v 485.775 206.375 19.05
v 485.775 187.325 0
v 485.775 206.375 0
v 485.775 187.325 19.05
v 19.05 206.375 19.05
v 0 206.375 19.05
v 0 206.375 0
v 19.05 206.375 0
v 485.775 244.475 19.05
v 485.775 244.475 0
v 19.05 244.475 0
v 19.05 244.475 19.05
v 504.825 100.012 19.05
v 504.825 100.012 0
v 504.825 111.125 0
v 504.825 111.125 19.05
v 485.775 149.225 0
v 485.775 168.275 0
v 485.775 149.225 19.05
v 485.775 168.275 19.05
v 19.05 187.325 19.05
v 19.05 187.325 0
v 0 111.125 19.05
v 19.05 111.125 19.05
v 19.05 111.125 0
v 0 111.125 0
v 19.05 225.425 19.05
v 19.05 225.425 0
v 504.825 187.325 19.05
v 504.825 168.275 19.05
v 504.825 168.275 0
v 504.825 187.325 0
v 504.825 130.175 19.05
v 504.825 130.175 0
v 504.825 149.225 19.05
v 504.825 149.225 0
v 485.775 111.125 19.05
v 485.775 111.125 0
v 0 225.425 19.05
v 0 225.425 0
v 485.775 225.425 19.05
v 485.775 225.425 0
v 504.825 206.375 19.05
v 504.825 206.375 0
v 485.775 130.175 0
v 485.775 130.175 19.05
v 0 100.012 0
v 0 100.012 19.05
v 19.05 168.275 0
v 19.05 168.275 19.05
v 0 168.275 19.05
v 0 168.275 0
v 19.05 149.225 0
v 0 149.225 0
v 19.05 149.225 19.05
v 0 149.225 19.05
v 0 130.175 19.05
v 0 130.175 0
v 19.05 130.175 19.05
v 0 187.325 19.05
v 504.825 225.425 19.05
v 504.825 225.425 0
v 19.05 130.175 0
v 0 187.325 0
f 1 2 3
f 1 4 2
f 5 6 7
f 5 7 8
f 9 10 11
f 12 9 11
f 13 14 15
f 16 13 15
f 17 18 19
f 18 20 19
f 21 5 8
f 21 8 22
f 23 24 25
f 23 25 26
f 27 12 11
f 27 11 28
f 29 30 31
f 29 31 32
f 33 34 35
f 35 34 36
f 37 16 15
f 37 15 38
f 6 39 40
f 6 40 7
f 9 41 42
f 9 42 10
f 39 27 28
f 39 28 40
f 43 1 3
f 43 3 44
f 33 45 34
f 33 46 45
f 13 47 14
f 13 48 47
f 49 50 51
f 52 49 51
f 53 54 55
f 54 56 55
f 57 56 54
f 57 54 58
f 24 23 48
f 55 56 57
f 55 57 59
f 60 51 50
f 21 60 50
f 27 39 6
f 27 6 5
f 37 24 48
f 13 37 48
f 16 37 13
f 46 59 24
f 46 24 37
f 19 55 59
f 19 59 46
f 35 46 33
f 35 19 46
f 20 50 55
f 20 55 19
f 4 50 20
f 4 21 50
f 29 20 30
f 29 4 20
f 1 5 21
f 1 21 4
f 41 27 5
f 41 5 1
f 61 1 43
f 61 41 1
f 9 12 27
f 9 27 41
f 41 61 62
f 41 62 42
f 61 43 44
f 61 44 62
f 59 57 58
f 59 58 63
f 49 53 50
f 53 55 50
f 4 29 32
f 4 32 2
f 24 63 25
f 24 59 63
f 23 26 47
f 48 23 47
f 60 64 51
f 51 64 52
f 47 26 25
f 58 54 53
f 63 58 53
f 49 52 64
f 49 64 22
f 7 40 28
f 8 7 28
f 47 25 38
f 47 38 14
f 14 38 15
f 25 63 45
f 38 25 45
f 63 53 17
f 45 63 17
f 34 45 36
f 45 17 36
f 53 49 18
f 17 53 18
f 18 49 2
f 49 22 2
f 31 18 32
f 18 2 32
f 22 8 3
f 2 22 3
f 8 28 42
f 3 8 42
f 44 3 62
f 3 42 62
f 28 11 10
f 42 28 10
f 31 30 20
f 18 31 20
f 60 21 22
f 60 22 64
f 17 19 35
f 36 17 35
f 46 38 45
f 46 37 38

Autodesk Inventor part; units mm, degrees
ref_plane "YZ Plane" through (0, 0, 0) normal (1, 0, 0) x (0, 1, 0)
ref_plane "XZ Plane" through (0, 0, 0) normal (0, 1, 0) x (-1, 0, 0)
ref_plane "XY Plane" through (0, 0, 0) normal (0, 0, 1) x (1, 0, 0)
sketch "Sketch1" plane through (0, 0, 0) normal (0, 0, 1) x (1, 0, 0)
  line L0 (0, 0) -> (252.4125, 0)
  line L1 (252.4125, 0) -> (252.4125, 244.475)
  line L2 (252.4125, 244.475) -> (0, 244.475)
  line L3 (0, 244.475) -> (0, 0)
  dimension "d0" = 252.4125
  dimension "d1" = 244.475
extrude "Extrusion1" add sketch "Sketch1" along normal blind 19.05
sketch "Sketch3" plane through (0, 0, 19.05) normal (0, 0, 1) x (1, 0, 0)
  line L0 (0, 0) -> (252.4125, 0) projected
  line L1 (252.4125, 244.475) -> (0, 244.475) projected
  line L2 (0, 244.475) -> (0, 0) projected
  line L3 (0, 244.475) -> (19.05, 244.475)
  line L4 (19.05, 244.475) -> (19.05, 225.425)
  line L5 (19.05, 225.425) -> (0, 225.425)
  line L6 (0, 225.425) -> (0, 244.475)
  line L7 (19.05, 168.275) -> (0, 168.275)
  line L8 (0, 168.275) -> (0, 149.225)
  line L9 (0, 149.225) -> (19.05, 149.225)
  line L10 (19.05, 149.225) -> (19.05, 168.275)
  line L11 (0, 130.175) -> (19.05, 130.175)
  line L12 (19.05, 130.175) -> (19.05, 111.125)
  line L13 (19.05, 111.125) -> (0, 111.125)
  line L14 (0, 111.125) -> (0, 130.175)
  line L15 (0, 206.375) -> (19.05, 206.375)
  line L16 (19.05, 206.375) -> (19.05, 187.325)
  line L17 (19.05, 187.325) -> (0, 187.325)
  line L18 (0, 187.325) -> (0, 206.375)
  line L19 (0, 92.075) -> (19.05, 92.075)
  line L20 (19.05, 92.075) -> (19.05, 73.025)
  line L21 (19.05, 73.025) -> (0, 73.025)
  line L22 (0, 73.025) -> (0, 92.075)
  line L23 (0, 53.975) -> (19.05, 53.975)
  line L24 (19.05, 53.975) -> (19.05, 34.925)
  line L25 (19.05, 34.925) -> (0, 34.925)
  line L26 (0, 34.925) -> (0, 53.975)
  line L27 (0, 15.875) -> (19.05, 15.875)
  line L28 (19.05, 15.875) -> (19.05, -3.175)
  line L29 (19.05, -3.175) -> (0, -3.175)
  line L30 (0, -3.175) -> (0, 15.875)
  dimension "d4" = 19.05
  dimension "d5" = 19.05
  dimension "d6" = 244.475
  dimension "d7" = 19.05
  dimension "d8" = 19.05
  dimension "d9" = 19.05
  dimension "d10" = 19.05
  dimension "d11" = 19.05
  dimension "d12" = 19.05
  dimension "d13" = 19.05
  dimension "d14" = 19.05
  dimension "d15" = 19.05
  dimension "d16" = 19.05
  dimension "d17" = 19.05
  dimension "d18" = 19.05
  dimension "d19" = 19.05
  dimension "d20" = 19.05
  dimension "d21" = 19.05
  dimension "d22" = 19.05
  dimension "d23" = 19.05
  dimension "d24" = 15.875
extrude "Extrusion2" cut sketch "Sketch3" against normal through all
mirror "Mirror1" about plane through (252.4125, 0, 0) normal (1, 0, 0)
sketch "Sketch7" plane through (0, 0, 19.05) normal (0, 0, 1) x (1, 0, 0)
  line L0 (19.05, 34.925) -> (0, 34.925) projected
  line L1 (0, 34.925) -> (0, 15.875) projected
  line L2 (0, 15.875) -> (19.05, 15.875) projected
  line L3 (19.05, 15.875) -> (19.05, 0) projected
  line L4 (19.05, 0) -> (485.775, 0) projected
  line L5 (485.775, 15.875) -> (485.775, 0) projected
  line L6 (504.825, 15.875) -> (485.775, 15.875) projected
  line L7 (504.825, 34.925) -> (504.825, 15.875) projected
  line L8 (485.775, 34.925) -> (504.825, 34.925) projected
  line L9 (485.775, 53.975) -> (485.775, 34.925) projected
  line L10 (504.825, 53.975) -> (485.775, 53.975) projected
  line L11 (504.825, 73.025) -> (504.825, 53.975) projected
  line L12 (485.775, 73.025) -> (504.825, 73.025) projected
  line L13 (485.775, 92.075) -> (485.775, 73.025) projected
  line L14 (504.825, 92.075) -> (485.775, 92.075) projected
  line L15 (504.825, 111.125) -> (504.825, 92.075) projected
  line L16 (19.05, 244.475) -> (485.775, 244.475) projected
  line L17 (0, 111.125) -> (0, 92.075) projected
  line L18 (0, 92.075) -> (19.05, 92.075) projected
  line L19 (19.05, 92.075) -> (19.05, 73.025) projected
  line L20 (19.05, 73.025) -> (0, 73.025) projected
  line L21 (0, 73.025) -> (0, 53.975) projected
  line L22 (0, 53.975) -> (19.05, 53.975) projected
  line L23 (19.05, 53.975) -> (19.05, 34.925) projected
  line L24 (0, 100.0125) -> (504.825, 100.0125)
  point P0 (0, 0)
  dimension "d56" = 144.4625
extrude "Extrusion4" cut sketch "Sketch7" against normal through all
properties part number "deep_side" material "Wood (Birch)"
